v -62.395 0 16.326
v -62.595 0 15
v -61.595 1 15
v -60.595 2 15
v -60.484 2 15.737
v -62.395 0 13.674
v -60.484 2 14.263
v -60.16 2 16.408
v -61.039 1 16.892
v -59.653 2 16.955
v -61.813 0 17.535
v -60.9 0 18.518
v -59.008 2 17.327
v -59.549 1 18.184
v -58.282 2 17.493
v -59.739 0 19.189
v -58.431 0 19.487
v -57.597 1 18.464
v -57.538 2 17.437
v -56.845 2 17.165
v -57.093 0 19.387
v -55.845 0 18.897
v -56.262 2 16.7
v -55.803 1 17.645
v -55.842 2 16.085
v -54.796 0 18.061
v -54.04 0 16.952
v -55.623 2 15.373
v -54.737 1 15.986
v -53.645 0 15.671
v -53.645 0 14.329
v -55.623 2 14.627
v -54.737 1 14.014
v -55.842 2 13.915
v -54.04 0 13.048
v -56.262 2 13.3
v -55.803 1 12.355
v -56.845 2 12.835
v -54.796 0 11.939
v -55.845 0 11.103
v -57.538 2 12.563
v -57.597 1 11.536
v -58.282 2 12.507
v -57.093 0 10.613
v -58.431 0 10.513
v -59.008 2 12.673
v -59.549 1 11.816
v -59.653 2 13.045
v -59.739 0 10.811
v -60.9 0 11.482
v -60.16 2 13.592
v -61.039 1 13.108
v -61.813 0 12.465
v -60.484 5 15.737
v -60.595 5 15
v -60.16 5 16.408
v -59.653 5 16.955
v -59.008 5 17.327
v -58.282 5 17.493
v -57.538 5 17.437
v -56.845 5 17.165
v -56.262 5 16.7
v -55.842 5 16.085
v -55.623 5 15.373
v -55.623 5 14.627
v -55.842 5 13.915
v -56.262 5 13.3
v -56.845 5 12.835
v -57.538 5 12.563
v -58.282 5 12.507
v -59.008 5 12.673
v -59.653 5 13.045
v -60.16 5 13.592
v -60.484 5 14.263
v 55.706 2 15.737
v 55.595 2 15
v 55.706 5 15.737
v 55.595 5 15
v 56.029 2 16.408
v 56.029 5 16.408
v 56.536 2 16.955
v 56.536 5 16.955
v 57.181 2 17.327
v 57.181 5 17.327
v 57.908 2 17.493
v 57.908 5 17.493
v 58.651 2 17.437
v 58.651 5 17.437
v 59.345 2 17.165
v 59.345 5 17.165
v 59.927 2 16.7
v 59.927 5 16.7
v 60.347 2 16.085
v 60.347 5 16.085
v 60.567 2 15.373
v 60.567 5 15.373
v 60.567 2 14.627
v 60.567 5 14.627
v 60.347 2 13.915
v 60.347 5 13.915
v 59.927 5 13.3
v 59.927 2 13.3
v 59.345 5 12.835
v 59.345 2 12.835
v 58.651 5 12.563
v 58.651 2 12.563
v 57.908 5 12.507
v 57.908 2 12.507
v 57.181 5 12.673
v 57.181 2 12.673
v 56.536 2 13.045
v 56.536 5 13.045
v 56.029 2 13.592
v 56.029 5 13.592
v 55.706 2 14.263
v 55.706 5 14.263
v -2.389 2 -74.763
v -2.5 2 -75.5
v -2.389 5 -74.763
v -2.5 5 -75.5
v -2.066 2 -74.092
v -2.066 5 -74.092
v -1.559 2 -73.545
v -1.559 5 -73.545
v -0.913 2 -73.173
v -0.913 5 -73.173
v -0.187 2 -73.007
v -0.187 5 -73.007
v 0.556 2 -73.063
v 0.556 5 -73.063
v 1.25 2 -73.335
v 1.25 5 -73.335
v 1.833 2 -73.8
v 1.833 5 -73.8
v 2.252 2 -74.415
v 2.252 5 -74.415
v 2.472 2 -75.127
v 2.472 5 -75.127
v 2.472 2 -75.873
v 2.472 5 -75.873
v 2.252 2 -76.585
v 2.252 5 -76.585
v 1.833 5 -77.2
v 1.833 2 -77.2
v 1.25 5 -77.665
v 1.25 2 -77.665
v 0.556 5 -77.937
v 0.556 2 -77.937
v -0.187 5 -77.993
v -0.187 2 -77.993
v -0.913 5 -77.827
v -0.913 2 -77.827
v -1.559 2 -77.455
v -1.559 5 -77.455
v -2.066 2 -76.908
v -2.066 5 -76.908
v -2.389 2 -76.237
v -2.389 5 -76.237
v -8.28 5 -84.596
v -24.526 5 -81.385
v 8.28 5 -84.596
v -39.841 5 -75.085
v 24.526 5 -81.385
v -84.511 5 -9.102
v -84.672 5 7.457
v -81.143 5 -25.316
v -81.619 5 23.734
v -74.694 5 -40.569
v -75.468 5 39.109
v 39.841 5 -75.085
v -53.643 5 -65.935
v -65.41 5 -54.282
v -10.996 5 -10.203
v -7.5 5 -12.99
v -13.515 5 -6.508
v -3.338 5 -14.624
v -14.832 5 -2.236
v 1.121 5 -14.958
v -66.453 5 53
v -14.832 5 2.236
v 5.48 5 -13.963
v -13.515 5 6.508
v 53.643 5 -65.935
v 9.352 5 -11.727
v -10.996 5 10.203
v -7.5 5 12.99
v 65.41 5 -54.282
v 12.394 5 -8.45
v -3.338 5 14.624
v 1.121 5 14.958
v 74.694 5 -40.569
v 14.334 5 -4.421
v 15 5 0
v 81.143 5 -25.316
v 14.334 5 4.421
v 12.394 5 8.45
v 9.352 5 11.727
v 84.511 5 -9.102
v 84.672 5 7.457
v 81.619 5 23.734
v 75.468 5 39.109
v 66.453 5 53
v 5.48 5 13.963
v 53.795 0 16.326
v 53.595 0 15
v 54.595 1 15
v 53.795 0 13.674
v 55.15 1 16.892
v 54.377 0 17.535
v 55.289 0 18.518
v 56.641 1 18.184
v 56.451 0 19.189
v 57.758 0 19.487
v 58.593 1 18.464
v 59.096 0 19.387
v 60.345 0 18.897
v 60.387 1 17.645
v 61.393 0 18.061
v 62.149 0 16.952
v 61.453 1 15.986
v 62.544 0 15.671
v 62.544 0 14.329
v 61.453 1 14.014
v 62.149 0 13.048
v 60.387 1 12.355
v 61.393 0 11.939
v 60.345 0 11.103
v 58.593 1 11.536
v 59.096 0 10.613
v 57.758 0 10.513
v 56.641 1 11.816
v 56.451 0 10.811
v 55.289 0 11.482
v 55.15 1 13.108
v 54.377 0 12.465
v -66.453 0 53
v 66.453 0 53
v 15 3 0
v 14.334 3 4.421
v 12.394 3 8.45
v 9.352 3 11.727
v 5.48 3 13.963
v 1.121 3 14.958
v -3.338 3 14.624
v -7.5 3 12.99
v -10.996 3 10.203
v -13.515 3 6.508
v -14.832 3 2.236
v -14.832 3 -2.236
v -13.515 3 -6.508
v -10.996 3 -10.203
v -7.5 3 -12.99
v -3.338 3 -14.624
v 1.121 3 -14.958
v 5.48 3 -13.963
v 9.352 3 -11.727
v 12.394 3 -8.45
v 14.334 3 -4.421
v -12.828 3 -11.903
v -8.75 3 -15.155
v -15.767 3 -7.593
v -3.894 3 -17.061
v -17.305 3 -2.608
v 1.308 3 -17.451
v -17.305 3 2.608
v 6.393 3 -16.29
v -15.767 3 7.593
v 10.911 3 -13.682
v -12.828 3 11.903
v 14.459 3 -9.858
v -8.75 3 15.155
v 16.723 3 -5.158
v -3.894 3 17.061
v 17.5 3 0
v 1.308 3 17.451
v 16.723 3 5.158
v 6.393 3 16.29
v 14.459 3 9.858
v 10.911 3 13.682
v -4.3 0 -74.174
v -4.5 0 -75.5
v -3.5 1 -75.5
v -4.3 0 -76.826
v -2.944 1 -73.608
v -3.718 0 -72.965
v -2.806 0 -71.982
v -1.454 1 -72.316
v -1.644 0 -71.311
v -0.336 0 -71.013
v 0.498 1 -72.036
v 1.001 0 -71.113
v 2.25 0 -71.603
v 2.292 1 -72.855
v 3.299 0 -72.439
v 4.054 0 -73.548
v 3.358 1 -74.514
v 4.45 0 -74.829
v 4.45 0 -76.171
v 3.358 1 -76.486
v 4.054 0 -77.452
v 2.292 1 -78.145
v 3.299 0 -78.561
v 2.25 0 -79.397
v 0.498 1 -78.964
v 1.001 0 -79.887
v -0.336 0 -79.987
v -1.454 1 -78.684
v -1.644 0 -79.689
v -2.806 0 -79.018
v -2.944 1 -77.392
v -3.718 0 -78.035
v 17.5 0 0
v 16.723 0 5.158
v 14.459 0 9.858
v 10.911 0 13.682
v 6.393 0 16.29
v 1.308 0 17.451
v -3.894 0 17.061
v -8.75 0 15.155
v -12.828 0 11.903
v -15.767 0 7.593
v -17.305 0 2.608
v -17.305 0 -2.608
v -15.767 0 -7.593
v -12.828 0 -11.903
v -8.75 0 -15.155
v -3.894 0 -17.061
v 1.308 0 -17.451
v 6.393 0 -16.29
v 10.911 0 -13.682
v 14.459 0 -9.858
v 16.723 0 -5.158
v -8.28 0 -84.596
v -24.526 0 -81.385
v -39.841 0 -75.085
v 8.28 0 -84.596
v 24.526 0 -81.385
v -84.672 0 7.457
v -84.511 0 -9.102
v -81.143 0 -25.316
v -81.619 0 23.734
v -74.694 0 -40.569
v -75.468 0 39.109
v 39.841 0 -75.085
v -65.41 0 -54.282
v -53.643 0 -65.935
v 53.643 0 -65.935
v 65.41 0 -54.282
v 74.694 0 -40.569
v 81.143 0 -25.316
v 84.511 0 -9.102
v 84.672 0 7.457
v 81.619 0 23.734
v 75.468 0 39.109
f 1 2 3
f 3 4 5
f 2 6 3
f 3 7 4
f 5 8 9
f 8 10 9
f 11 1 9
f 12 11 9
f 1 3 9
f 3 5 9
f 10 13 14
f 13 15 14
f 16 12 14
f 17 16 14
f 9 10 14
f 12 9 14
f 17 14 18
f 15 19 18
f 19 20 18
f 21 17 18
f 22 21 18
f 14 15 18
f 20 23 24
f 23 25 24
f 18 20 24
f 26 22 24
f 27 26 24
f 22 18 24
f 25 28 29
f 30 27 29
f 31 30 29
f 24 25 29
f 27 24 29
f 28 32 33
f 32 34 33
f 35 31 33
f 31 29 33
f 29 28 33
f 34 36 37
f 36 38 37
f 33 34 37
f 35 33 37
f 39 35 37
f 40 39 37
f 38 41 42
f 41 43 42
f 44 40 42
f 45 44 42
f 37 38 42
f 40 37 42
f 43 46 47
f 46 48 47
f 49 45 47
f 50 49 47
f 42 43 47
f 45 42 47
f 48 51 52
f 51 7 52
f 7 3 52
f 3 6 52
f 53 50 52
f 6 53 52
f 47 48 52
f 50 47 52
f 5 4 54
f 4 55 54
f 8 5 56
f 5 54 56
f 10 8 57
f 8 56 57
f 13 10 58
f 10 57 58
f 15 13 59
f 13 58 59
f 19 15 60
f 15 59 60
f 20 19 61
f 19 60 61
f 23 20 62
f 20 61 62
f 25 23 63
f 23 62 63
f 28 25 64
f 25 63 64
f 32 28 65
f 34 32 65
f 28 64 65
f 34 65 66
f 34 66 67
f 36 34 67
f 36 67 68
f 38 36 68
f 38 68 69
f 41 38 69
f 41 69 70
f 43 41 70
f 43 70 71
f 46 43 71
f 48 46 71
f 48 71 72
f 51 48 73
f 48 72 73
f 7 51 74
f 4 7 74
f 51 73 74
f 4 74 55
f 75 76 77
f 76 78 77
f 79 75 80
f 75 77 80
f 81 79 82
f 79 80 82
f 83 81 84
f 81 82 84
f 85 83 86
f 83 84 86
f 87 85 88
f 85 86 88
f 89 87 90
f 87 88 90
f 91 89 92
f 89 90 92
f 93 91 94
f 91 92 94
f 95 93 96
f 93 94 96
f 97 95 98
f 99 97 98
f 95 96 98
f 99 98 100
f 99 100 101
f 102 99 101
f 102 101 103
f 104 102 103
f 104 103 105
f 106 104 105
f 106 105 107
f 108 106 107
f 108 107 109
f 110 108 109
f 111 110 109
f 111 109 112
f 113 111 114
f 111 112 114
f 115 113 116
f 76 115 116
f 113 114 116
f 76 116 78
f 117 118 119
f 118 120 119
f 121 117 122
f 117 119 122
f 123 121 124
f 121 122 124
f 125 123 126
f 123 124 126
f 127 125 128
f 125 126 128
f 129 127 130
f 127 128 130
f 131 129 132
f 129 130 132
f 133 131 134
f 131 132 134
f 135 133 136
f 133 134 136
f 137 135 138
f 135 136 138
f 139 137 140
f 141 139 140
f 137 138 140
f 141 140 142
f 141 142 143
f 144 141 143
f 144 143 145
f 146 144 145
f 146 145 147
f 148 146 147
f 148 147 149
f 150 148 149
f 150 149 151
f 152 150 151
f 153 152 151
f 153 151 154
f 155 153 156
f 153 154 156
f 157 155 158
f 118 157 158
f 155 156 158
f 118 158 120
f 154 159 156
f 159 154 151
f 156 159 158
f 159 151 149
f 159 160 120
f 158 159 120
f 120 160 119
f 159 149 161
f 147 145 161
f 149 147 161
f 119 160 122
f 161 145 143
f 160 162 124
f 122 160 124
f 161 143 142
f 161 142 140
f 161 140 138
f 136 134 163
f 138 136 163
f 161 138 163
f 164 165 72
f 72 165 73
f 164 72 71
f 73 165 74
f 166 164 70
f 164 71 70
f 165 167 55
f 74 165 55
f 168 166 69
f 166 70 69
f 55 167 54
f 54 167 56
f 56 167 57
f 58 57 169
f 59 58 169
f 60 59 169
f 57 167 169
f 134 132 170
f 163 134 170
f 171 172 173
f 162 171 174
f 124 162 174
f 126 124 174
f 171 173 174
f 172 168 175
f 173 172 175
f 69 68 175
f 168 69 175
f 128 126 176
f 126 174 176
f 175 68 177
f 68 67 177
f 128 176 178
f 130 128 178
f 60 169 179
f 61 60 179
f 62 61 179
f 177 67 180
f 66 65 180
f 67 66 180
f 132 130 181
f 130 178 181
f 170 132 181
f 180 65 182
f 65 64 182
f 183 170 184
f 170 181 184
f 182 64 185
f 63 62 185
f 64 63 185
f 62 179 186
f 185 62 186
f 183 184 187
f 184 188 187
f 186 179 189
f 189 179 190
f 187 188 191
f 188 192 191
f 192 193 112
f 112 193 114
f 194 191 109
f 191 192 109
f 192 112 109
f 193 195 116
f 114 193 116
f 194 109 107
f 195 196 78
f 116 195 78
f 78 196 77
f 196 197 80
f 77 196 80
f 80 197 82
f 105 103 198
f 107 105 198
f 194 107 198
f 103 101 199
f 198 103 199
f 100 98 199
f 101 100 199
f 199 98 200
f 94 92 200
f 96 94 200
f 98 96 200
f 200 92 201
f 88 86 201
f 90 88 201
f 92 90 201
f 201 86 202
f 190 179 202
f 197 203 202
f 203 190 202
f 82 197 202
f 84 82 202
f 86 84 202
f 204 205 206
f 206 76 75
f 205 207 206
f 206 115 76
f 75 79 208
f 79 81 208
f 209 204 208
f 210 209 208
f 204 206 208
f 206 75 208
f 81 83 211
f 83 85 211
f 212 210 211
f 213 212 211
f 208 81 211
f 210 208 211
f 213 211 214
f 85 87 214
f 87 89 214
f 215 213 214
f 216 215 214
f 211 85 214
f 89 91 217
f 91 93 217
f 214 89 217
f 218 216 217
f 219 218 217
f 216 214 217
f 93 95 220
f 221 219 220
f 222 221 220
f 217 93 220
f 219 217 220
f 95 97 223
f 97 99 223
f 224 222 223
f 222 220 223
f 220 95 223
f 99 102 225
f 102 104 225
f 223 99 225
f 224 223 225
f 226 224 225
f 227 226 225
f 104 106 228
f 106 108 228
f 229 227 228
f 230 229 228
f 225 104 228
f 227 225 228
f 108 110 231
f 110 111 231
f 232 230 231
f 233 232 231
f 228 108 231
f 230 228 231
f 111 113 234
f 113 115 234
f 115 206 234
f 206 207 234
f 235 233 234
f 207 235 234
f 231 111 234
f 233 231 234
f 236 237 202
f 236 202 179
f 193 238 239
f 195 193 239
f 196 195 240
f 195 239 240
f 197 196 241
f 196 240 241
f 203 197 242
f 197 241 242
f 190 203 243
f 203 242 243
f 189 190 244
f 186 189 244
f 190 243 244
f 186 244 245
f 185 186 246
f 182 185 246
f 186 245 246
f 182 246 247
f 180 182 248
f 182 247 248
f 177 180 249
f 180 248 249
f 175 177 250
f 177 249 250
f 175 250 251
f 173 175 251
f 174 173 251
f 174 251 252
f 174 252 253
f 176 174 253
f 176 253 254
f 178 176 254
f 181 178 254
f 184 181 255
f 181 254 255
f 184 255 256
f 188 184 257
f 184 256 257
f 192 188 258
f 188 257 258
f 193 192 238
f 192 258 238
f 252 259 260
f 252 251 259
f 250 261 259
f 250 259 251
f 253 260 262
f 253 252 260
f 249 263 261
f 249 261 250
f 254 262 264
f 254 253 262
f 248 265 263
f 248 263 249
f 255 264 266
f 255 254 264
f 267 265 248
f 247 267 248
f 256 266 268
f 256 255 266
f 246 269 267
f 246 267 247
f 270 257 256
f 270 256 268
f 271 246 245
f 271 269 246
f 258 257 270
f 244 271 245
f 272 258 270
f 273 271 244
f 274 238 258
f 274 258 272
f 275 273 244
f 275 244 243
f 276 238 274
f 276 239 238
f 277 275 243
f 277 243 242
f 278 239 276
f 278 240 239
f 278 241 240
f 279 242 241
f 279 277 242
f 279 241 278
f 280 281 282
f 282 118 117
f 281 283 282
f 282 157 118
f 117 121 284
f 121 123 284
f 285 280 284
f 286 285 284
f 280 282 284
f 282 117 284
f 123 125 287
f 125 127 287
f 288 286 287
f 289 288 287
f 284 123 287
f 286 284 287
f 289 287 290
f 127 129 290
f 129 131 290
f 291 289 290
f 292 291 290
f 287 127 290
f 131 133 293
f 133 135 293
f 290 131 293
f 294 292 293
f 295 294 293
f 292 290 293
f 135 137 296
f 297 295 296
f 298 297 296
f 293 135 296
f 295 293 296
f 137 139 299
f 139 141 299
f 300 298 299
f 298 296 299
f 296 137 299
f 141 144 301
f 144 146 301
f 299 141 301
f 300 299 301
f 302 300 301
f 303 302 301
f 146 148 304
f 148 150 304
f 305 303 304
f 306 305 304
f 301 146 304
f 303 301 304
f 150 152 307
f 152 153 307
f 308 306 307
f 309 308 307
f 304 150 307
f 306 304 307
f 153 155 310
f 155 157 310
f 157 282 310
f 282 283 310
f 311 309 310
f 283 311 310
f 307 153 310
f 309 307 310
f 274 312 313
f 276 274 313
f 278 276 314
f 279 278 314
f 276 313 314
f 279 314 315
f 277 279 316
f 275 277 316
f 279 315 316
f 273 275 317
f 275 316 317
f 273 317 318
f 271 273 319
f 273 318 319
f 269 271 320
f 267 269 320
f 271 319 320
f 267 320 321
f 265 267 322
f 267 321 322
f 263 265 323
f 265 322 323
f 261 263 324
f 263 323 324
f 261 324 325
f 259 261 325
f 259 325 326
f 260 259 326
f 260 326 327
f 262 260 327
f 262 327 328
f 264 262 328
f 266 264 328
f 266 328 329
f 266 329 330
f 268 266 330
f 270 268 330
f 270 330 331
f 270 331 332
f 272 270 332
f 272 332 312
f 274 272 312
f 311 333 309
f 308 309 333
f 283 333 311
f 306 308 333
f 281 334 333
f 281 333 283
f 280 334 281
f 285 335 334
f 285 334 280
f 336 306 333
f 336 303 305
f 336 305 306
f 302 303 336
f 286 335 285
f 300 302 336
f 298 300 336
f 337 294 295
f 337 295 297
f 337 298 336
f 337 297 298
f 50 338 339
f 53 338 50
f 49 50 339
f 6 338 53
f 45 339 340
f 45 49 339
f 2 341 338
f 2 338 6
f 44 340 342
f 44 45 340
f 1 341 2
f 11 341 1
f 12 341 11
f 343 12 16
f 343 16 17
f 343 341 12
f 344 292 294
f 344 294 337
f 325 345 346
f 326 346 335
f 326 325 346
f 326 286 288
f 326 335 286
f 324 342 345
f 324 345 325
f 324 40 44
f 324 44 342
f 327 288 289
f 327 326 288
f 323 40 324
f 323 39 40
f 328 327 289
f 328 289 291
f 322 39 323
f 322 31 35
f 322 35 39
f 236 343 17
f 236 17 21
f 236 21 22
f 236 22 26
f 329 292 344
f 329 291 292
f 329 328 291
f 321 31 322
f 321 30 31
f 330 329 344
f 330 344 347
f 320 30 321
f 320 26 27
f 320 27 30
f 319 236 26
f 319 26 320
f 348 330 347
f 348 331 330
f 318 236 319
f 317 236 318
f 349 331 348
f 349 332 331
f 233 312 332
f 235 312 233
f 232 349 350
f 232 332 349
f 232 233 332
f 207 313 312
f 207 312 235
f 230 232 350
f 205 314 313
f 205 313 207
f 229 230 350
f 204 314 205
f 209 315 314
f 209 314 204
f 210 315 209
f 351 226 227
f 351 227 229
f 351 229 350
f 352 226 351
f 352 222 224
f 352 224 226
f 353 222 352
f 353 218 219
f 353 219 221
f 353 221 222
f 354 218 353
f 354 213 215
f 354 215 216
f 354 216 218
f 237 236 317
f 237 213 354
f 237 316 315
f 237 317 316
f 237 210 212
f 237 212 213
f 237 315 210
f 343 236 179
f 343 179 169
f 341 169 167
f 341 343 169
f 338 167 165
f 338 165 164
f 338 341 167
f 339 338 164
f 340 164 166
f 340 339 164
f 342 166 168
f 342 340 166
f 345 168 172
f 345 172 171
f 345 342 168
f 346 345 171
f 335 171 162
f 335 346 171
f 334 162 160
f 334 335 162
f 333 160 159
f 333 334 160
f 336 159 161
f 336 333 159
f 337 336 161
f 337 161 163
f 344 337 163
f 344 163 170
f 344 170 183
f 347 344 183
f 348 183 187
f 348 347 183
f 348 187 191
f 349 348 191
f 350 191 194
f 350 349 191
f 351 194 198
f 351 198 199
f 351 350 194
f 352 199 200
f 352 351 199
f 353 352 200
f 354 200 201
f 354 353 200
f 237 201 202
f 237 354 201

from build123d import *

# Parameters (mm, degrees)
F1_R           = 2.5
F1_R_2         = 17.5
F2_DEPTH       = 5
F3_START       = -3
F1_R_3         = 15
F3_DEPTH       = 2
F4_D           = 5
F4_CSINK_D     = 9
F4_CSINK_ANGLE = 90


with BuildPart() as f2:
    # F1 (on Front) → F2 (new body)
    with BuildSketch(Plane.XZ):
        with BuildLine():
            Line((66.4529909033, 53), (-66.4529909033, 53))
            ThreePointArc((-66.4529909033, 53), (0, -85), (66.4529909033, 53))
        make_face()
        with Locations((0, -75.5)):
            Circle(F1_R, mode=Mode.SUBTRACT)
        with Locations((-58.0947501931, 15)):
            Circle(F1_R, mode=Mode.SUBTRACT)
        Circle(F1_R_2, mode=Mode.SUBTRACT)
        with Locations((58.0947501931, 15)):
            Circle(F1_R, mode=Mode.SUBTRACT)
        with Locations((-58.0947501931, 15)):
            Circle(F1_R)
        with Locations((58.0947501931, 15)):
            Circle(F1_R)
        with Locations((0, -75.5)):
            Circle(F1_R)
    extrude(amount=-F2_DEPTH)

    # F1 (on Front) → F3 (join)
    with BuildSketch(Plane.XZ.offset(F3_START)):
        Circle(F1_R_2)
        Circle(F1_R_3, mode=Mode.SUBTRACT)
    extrude(amount=-F3_DEPTH)

    # F4 (through all)
    with Locations(Plane.XZ):
        with Locations((-58.0947501931, 15), (58.0947501931, 15), (0, -75.5)):
            CounterSinkHole(F4_D / 2, F4_CSINK_D / 2, counter_sink_angle=F4_CSINK_ANGLE)


solid = f2.part
